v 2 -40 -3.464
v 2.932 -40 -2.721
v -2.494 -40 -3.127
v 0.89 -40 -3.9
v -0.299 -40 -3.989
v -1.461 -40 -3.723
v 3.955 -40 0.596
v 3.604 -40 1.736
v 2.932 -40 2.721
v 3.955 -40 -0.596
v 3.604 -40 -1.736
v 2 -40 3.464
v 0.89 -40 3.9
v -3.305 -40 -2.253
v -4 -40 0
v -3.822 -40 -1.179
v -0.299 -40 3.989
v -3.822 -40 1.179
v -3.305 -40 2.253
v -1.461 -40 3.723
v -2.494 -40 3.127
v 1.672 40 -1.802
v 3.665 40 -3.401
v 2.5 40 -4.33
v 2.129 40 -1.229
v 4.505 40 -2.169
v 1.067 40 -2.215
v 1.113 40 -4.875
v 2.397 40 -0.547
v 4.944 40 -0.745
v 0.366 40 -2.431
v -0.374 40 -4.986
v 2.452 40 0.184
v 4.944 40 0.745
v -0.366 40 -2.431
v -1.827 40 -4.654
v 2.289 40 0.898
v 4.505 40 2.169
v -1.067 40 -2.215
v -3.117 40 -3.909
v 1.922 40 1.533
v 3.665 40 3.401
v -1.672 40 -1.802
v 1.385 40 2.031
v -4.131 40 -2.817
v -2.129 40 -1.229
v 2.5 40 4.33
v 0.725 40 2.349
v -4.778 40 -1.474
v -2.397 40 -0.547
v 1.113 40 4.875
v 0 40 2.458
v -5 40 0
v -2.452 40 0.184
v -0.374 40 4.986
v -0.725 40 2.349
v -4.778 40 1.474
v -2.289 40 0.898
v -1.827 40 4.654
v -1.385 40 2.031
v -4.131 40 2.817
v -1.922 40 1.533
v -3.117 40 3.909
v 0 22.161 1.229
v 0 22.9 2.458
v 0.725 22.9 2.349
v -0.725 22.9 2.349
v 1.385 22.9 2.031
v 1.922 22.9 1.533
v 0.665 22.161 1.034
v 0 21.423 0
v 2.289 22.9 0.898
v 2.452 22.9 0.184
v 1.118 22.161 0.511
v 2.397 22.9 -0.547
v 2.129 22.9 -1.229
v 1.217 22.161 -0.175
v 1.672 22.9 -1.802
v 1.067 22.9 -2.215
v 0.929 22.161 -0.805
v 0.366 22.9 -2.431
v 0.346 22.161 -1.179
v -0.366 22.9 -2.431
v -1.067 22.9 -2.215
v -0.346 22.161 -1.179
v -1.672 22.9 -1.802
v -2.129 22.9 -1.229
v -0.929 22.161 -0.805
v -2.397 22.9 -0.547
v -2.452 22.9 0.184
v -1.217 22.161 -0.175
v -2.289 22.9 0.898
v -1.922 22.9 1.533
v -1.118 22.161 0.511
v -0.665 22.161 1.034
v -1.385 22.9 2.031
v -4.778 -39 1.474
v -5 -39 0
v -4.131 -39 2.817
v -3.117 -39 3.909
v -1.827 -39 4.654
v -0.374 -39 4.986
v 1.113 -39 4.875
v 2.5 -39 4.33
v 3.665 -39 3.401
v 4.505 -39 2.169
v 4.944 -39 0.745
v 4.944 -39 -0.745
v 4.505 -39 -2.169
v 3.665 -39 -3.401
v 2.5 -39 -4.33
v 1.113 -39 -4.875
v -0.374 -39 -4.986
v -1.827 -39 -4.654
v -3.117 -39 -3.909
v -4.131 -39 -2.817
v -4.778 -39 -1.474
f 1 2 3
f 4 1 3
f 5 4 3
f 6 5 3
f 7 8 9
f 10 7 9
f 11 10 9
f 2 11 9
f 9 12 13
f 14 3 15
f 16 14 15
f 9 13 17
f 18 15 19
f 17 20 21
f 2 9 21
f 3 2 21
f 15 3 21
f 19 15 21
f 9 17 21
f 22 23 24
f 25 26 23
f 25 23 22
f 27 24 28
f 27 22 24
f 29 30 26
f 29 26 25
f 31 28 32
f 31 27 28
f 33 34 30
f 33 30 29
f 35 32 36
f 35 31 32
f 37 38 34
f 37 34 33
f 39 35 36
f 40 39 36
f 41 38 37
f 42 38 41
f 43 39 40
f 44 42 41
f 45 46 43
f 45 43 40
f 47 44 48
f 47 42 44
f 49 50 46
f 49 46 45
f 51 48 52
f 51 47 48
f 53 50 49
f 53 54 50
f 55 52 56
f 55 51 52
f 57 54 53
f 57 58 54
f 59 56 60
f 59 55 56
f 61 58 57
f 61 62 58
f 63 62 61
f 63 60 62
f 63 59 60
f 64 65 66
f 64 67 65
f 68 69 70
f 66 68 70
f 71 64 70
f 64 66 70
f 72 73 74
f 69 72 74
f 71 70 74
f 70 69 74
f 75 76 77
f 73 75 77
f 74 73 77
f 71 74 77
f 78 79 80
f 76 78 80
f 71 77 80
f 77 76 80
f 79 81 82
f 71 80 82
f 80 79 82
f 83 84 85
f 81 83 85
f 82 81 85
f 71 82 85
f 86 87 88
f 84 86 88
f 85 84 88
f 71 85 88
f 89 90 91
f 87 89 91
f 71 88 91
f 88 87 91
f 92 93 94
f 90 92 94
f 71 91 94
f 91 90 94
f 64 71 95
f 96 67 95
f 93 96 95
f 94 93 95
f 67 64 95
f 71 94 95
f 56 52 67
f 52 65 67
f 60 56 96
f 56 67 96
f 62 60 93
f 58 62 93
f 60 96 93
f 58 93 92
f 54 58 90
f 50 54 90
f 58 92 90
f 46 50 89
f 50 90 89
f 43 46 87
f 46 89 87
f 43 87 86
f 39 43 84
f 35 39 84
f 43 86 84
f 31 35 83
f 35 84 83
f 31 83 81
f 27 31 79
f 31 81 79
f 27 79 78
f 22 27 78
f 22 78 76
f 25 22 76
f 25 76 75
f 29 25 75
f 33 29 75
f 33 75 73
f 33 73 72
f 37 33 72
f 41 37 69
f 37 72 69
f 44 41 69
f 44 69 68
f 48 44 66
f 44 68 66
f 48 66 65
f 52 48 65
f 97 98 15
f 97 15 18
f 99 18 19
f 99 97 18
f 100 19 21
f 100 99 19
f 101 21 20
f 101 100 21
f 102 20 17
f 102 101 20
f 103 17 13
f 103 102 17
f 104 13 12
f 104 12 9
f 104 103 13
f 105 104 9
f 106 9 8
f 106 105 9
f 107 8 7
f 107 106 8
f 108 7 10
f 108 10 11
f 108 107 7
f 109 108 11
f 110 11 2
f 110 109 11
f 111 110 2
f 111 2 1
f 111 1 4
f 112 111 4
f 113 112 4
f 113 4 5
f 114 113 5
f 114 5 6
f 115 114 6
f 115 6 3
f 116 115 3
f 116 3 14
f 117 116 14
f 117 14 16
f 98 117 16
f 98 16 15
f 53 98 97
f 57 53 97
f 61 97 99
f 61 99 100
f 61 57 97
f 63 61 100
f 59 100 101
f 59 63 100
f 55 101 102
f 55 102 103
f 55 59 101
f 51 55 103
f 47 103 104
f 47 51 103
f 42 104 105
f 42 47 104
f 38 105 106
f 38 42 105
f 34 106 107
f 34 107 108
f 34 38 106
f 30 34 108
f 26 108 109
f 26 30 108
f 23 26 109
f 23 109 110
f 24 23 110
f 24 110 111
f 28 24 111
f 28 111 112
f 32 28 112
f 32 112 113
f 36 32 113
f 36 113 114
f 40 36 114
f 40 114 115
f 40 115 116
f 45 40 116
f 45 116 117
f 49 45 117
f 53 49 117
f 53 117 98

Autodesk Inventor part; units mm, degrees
ref_plane "YZ Plane" through (0, 0, 0) normal (1, 0, 0) x (0, 1, 0)
ref_plane "XZ Plane" through (0, 0, 0) normal (0, 1, 0) x (-1, 0, 0)
ref_plane "XY Plane" through (0, 0, 0) normal (0, 0, 1) x (1, 0, 0)
sketch "Sketch1" plane through (0, 0, 0) normal (0, 1, 0) x (-1, 0, 0)
  circle A0 centre (0, 0) radius 5
  dimension "d0" = 10
extrude "Extrusion1" add sketch "Sketch1" along normal mid plane 80
chamfer "Chamfer1" distance 1 angle 45 1 edges at (5, -40, 0)
hole "Hole3" at (0, 40, 0) direction (0, -1, 0) diameter 4.917 depth 17.1 tip angle 118 thread size "M6x1" class "6H" standard "ANSI Metric M Profile"
properties part number "suporte-barra" material "Aluminium AW-7020"
